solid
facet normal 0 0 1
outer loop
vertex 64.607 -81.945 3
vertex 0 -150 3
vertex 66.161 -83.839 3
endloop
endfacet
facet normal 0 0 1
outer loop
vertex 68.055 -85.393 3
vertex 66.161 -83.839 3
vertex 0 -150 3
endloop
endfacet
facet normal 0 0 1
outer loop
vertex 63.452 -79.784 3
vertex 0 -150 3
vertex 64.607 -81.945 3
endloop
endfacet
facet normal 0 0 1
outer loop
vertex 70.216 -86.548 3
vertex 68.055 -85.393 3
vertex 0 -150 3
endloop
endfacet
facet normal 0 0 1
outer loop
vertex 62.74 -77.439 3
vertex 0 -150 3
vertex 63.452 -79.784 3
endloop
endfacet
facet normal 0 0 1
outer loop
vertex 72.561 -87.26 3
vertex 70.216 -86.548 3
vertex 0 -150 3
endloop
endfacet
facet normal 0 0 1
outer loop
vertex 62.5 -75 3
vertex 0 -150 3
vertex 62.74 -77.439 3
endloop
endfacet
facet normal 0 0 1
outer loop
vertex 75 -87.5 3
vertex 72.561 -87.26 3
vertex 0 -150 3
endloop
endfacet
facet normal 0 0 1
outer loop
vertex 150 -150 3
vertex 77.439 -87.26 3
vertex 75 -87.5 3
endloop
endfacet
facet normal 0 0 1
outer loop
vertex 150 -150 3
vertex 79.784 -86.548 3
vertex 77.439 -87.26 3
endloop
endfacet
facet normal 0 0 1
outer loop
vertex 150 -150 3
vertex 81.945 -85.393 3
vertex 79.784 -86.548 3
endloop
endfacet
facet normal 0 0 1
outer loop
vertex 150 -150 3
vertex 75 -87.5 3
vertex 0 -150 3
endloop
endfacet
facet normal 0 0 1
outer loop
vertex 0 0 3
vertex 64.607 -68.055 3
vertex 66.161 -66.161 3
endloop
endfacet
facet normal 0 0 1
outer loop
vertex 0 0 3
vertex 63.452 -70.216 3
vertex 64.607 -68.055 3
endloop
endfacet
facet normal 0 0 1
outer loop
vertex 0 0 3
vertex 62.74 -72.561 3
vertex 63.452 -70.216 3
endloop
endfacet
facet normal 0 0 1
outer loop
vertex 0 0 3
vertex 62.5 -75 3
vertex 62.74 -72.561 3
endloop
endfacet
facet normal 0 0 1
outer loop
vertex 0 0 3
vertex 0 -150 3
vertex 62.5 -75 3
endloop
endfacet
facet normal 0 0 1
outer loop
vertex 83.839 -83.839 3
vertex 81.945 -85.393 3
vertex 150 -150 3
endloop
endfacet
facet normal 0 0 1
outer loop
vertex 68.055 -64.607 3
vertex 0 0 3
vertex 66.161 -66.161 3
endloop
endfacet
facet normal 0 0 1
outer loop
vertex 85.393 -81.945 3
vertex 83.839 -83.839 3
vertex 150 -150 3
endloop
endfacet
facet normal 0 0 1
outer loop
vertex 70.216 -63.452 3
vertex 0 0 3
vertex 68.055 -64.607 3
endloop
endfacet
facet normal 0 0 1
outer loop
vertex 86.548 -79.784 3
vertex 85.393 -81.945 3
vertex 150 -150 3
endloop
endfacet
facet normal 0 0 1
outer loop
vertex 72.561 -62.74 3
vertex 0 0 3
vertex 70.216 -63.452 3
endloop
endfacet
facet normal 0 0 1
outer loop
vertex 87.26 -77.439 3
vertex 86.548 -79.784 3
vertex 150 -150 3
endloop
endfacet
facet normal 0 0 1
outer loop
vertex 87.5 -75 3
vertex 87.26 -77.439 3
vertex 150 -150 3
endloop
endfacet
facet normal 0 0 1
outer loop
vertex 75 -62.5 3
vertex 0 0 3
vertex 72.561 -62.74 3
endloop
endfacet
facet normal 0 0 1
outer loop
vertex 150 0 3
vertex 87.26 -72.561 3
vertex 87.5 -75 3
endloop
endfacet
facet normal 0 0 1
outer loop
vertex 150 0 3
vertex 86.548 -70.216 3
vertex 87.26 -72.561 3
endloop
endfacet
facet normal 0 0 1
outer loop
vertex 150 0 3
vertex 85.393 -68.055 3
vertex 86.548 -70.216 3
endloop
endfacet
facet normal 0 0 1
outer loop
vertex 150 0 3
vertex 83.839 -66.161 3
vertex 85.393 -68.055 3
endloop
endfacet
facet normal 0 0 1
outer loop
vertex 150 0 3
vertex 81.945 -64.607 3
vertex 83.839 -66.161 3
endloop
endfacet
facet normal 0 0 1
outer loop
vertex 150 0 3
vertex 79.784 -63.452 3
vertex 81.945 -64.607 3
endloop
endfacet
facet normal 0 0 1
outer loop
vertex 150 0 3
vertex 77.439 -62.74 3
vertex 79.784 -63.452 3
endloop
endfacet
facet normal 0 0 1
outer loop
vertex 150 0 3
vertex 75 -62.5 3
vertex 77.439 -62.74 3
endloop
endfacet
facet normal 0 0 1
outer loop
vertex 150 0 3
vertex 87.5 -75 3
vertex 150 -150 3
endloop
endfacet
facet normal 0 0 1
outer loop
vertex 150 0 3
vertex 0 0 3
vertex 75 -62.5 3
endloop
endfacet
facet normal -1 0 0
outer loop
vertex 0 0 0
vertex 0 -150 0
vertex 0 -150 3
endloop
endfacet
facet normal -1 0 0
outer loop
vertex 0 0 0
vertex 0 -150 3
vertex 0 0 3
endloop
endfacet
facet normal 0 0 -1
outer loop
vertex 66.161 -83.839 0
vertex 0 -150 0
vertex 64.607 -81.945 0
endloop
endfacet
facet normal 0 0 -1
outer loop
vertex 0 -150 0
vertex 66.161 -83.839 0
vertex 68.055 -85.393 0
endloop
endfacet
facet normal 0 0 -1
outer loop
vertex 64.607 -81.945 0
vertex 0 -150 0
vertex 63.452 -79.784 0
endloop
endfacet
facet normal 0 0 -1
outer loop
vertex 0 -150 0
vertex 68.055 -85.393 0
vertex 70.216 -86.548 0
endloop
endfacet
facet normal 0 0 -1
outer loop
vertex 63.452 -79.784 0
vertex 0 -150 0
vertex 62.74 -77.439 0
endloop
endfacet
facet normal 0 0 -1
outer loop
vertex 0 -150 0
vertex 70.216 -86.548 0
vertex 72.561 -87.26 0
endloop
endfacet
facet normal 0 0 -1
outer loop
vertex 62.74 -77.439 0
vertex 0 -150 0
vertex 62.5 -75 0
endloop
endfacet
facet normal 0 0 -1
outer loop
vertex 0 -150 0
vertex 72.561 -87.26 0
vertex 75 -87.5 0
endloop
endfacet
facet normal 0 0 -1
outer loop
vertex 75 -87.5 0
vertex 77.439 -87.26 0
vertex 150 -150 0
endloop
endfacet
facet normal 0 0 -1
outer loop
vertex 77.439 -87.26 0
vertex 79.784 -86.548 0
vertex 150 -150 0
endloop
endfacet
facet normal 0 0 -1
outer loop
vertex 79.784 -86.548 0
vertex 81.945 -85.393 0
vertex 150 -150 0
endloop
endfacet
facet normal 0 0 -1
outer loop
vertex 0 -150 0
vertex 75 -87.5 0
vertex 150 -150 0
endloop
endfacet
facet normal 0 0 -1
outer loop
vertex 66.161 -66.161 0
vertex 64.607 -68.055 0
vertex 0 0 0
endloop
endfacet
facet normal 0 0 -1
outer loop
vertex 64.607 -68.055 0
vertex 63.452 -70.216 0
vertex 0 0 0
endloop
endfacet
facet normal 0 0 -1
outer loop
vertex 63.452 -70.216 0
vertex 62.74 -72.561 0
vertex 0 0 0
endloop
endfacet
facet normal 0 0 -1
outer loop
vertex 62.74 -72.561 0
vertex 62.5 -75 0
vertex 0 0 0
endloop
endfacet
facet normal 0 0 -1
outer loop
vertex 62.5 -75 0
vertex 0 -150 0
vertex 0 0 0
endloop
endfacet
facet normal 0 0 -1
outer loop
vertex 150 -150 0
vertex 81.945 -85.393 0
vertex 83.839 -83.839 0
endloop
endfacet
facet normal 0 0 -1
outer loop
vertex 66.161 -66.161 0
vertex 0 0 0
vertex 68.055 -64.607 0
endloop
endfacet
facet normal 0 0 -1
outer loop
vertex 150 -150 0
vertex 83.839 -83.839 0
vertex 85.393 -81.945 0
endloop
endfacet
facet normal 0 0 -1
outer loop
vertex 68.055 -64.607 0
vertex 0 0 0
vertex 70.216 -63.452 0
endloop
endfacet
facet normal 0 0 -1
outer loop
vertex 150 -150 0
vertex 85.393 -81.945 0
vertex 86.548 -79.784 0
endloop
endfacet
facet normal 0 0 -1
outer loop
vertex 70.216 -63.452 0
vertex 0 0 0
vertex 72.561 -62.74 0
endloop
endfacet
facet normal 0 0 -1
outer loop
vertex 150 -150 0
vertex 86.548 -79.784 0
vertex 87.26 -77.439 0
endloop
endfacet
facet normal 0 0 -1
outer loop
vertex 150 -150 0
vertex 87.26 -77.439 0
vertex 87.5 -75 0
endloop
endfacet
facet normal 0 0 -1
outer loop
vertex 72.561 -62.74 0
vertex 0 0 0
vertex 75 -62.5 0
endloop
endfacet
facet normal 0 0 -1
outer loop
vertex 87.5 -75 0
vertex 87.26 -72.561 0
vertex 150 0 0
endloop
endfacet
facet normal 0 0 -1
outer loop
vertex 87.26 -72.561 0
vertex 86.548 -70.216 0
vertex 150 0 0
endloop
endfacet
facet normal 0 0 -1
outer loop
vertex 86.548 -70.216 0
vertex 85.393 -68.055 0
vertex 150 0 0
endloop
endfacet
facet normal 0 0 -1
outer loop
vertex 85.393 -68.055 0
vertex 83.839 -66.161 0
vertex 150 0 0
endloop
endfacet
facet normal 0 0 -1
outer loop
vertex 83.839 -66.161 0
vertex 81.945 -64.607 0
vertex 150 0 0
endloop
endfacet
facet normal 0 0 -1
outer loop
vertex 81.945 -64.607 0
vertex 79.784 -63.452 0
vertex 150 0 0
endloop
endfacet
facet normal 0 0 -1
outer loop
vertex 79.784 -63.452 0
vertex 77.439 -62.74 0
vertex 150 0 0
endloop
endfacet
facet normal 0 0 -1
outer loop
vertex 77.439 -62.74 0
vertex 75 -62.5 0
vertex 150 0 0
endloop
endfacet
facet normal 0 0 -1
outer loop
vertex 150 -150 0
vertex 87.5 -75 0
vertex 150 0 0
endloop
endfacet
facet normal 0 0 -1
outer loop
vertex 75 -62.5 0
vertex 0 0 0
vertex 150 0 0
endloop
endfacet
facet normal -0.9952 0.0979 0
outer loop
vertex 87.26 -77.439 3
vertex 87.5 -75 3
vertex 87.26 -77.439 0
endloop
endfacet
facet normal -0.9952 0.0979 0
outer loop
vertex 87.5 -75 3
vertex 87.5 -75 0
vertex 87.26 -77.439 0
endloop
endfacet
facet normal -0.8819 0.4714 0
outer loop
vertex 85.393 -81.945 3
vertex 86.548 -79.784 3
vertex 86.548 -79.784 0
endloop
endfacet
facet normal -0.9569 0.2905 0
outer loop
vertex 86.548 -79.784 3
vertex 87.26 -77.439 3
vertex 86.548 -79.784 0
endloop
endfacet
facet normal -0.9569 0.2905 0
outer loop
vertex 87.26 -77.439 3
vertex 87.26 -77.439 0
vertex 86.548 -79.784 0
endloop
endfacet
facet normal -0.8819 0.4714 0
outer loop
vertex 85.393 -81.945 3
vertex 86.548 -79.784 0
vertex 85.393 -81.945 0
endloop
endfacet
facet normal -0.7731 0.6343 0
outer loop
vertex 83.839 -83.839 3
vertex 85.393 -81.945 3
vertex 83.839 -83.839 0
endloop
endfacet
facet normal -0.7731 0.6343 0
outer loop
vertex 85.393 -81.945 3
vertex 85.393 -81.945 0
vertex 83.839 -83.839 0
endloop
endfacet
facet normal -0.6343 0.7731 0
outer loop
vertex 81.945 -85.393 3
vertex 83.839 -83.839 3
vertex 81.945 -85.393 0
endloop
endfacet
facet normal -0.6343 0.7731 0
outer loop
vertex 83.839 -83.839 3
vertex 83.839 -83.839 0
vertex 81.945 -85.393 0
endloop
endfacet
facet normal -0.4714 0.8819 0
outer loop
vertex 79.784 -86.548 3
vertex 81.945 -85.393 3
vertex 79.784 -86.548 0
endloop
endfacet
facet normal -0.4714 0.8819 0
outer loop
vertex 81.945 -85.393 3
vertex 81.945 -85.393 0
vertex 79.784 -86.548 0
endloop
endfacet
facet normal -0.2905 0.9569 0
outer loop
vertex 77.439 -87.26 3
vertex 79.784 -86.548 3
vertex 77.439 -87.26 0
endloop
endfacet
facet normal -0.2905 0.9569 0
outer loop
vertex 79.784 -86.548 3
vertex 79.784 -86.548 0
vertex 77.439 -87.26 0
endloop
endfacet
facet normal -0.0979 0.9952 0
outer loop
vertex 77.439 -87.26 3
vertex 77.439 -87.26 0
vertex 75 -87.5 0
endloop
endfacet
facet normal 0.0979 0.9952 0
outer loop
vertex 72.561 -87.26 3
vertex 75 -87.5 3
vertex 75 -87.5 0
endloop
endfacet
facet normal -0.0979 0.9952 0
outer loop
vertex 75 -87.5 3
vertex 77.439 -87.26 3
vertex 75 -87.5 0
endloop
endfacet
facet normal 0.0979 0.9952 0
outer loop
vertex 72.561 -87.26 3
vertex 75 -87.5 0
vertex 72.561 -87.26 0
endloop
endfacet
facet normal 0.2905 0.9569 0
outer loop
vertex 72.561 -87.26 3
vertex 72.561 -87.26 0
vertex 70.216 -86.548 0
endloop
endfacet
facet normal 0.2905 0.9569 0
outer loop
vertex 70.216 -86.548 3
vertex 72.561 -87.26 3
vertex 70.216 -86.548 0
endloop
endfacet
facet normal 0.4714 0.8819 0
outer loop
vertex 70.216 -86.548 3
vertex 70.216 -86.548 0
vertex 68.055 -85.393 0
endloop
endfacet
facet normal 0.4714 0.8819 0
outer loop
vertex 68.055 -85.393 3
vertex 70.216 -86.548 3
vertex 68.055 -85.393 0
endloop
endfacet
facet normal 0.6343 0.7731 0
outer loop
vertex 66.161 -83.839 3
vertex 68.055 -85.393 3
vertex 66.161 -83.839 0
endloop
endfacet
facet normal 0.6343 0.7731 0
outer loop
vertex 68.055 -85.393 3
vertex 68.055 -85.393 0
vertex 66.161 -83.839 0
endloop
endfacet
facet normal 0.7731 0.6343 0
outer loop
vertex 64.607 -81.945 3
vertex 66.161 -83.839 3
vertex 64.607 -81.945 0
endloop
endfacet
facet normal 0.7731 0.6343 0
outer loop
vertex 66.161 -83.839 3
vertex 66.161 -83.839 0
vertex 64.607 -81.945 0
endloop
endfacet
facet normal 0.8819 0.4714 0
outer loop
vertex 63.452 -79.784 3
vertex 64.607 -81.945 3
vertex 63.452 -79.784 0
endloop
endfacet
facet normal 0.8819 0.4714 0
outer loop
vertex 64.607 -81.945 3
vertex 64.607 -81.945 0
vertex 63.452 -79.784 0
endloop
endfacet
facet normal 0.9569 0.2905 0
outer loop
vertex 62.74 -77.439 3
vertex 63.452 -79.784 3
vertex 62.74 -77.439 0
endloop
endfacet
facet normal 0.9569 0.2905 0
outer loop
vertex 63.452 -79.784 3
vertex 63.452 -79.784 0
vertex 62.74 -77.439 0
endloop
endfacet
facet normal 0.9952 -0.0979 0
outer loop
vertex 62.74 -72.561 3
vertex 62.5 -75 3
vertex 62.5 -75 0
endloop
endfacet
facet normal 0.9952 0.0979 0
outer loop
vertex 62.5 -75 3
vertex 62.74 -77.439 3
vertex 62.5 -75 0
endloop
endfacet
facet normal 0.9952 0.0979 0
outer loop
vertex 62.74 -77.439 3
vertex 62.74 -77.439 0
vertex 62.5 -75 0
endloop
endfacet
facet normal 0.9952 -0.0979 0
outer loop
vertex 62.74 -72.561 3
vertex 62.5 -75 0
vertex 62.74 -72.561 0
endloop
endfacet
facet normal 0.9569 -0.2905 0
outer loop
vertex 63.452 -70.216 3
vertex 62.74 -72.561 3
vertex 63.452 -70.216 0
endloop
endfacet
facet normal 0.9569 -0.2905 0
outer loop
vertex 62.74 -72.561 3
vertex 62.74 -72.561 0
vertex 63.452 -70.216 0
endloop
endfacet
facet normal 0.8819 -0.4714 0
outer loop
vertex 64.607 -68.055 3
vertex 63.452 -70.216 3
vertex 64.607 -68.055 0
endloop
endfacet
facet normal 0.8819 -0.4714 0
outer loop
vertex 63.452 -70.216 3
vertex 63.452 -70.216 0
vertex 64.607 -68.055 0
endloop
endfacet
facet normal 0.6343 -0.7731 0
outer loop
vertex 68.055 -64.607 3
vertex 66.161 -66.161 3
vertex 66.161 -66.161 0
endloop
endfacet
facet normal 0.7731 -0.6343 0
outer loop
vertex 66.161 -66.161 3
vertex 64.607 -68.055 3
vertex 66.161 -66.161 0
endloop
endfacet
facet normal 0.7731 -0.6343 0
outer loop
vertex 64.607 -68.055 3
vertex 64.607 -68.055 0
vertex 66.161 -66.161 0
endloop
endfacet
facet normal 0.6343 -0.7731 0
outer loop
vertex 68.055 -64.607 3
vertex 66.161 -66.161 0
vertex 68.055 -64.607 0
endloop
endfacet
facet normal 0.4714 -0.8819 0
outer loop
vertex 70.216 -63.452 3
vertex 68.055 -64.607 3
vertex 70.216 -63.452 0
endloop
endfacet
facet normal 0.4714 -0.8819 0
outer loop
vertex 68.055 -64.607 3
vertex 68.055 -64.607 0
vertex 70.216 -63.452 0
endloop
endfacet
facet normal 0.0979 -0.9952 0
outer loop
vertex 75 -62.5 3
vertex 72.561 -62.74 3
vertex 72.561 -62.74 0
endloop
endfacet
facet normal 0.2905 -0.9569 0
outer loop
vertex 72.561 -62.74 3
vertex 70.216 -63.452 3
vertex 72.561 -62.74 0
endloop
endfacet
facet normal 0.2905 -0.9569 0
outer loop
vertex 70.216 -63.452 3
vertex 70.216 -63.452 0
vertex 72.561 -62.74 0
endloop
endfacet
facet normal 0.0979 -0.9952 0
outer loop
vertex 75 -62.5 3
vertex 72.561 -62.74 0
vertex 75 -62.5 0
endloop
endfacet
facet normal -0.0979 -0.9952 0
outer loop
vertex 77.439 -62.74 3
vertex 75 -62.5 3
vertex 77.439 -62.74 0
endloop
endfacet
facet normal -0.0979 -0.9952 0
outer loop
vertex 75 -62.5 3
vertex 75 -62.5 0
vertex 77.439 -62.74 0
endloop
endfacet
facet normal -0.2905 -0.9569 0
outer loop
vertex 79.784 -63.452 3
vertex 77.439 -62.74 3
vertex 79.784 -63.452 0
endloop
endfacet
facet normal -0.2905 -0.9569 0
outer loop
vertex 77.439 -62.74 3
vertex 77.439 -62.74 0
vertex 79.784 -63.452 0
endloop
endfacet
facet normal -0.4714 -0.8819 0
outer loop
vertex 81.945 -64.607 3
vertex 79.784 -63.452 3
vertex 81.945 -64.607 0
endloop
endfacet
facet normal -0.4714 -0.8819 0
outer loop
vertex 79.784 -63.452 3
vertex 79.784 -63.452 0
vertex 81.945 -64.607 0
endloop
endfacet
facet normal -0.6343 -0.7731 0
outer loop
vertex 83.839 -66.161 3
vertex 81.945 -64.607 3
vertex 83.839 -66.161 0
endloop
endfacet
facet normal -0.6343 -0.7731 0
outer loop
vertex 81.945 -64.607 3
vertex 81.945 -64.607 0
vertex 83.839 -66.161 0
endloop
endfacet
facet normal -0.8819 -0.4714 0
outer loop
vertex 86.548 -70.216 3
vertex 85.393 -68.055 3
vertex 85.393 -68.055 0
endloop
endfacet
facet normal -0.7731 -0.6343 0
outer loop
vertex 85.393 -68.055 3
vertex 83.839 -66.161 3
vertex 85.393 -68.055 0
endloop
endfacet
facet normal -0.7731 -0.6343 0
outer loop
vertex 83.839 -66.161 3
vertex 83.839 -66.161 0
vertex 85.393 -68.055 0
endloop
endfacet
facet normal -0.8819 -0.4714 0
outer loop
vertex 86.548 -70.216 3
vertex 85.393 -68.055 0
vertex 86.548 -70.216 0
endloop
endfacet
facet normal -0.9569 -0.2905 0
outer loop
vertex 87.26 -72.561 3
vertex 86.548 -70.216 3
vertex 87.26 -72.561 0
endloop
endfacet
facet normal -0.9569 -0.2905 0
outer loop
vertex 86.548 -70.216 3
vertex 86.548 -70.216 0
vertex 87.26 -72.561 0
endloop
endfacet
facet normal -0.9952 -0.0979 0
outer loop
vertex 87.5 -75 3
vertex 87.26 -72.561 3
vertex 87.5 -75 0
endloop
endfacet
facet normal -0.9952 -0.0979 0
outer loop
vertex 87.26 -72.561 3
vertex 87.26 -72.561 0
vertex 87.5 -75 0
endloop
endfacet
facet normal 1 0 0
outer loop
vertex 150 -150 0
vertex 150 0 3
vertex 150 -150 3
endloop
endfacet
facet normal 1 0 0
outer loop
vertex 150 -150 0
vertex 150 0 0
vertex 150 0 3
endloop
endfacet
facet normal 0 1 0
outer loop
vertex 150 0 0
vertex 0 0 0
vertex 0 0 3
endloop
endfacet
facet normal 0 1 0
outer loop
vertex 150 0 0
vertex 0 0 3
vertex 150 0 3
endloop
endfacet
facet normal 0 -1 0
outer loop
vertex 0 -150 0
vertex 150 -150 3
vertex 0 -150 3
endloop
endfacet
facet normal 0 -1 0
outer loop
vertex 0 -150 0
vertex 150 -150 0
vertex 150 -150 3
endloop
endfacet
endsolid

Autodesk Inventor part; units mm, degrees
ref_plane "YZ Plane" through (0, 0, 0) normal (1, 0, 0) x (0, 1, 0)
ref_plane "XZ Plane" through (0, 0, 0) normal (0, 1, 0) x (-1, 0, 0)
ref_plane "XY Plane" through (0, 0, 0) normal (0, 0, 1) x (1, 0, 0)
sketch "Sketch1" plane through (0, 0, 0) normal (0, 0, 1) x (1, 0, 0)
  line L0 (0, 0) -> (150, 0)
  line L1 (150, 0) -> (150, -150)
  line L2 (150, -150) -> (0, -150)
  line L3 (0, -150) -> (0, 0)
  circle A0 centre (75, -75) radius 12.5
  dimension "d0" = 150
  dimension "d1" = 150
  dimension "d2" = 25
  dimension "d3" = 75
  dimension "d4" = 75
extrude "Extrusion1" add sketch "Sketch1" along normal blind 3
ref_plane "Work Plane3" through (0, -75, 0) normal (0, 1, 0) x (1, 0, 0)
ref_plane "Work Plane4" through (75, -150, 0) normal (1, 0, 0) x (0, 0, -1)
properties part number "box" material "ABS Plastic"
